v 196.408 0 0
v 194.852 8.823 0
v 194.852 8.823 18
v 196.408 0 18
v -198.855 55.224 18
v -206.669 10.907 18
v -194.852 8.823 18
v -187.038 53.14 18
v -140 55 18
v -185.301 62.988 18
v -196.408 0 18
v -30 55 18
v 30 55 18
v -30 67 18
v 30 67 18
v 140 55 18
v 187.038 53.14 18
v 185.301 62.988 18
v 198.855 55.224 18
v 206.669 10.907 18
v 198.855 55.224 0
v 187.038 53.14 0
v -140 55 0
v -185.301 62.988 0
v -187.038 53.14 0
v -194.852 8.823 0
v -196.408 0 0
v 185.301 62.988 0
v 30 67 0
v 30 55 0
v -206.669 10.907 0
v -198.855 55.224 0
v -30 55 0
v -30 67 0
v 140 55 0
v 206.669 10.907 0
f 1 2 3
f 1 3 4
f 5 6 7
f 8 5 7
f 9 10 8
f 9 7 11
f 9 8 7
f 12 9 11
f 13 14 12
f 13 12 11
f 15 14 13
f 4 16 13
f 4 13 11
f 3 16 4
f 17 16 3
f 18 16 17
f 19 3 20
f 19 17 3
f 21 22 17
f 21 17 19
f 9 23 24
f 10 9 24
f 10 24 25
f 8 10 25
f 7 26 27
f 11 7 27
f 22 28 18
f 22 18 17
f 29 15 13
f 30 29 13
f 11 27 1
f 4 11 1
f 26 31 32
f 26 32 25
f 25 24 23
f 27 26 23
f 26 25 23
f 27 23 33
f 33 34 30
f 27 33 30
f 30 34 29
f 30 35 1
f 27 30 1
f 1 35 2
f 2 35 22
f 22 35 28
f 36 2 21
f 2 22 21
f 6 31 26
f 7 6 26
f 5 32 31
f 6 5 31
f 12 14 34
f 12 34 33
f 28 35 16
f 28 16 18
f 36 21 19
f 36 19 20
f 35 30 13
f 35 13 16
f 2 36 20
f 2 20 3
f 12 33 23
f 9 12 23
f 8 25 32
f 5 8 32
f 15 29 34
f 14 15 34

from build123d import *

# Parameters (mm, degrees)
PAD_DEPTH = 18


with BuildPart() as part:
    # Sketch → Pad (new body)
    with BuildSketch(Plane.XY):
        Polygon((0, 67), (30, 67), (30, 55), (140, 55), (185.301157, 62.987816), (187.037638, 53.139739), (198.855331, 55.223517), (206.669499, 10.907168), (194.851806, 8.82339), (196.407608, 0), (0, 0), align=None)
    pad = extrude(amount=PAD_DEPTH)

    # Mirrored: Pad across Sketch V_Axis
    add(pad.mirror(Plane(origin=(0, 0, 0), x_dir=(0, 0, 1), z_dir=(1, 0, 0))))


solid = part.part
